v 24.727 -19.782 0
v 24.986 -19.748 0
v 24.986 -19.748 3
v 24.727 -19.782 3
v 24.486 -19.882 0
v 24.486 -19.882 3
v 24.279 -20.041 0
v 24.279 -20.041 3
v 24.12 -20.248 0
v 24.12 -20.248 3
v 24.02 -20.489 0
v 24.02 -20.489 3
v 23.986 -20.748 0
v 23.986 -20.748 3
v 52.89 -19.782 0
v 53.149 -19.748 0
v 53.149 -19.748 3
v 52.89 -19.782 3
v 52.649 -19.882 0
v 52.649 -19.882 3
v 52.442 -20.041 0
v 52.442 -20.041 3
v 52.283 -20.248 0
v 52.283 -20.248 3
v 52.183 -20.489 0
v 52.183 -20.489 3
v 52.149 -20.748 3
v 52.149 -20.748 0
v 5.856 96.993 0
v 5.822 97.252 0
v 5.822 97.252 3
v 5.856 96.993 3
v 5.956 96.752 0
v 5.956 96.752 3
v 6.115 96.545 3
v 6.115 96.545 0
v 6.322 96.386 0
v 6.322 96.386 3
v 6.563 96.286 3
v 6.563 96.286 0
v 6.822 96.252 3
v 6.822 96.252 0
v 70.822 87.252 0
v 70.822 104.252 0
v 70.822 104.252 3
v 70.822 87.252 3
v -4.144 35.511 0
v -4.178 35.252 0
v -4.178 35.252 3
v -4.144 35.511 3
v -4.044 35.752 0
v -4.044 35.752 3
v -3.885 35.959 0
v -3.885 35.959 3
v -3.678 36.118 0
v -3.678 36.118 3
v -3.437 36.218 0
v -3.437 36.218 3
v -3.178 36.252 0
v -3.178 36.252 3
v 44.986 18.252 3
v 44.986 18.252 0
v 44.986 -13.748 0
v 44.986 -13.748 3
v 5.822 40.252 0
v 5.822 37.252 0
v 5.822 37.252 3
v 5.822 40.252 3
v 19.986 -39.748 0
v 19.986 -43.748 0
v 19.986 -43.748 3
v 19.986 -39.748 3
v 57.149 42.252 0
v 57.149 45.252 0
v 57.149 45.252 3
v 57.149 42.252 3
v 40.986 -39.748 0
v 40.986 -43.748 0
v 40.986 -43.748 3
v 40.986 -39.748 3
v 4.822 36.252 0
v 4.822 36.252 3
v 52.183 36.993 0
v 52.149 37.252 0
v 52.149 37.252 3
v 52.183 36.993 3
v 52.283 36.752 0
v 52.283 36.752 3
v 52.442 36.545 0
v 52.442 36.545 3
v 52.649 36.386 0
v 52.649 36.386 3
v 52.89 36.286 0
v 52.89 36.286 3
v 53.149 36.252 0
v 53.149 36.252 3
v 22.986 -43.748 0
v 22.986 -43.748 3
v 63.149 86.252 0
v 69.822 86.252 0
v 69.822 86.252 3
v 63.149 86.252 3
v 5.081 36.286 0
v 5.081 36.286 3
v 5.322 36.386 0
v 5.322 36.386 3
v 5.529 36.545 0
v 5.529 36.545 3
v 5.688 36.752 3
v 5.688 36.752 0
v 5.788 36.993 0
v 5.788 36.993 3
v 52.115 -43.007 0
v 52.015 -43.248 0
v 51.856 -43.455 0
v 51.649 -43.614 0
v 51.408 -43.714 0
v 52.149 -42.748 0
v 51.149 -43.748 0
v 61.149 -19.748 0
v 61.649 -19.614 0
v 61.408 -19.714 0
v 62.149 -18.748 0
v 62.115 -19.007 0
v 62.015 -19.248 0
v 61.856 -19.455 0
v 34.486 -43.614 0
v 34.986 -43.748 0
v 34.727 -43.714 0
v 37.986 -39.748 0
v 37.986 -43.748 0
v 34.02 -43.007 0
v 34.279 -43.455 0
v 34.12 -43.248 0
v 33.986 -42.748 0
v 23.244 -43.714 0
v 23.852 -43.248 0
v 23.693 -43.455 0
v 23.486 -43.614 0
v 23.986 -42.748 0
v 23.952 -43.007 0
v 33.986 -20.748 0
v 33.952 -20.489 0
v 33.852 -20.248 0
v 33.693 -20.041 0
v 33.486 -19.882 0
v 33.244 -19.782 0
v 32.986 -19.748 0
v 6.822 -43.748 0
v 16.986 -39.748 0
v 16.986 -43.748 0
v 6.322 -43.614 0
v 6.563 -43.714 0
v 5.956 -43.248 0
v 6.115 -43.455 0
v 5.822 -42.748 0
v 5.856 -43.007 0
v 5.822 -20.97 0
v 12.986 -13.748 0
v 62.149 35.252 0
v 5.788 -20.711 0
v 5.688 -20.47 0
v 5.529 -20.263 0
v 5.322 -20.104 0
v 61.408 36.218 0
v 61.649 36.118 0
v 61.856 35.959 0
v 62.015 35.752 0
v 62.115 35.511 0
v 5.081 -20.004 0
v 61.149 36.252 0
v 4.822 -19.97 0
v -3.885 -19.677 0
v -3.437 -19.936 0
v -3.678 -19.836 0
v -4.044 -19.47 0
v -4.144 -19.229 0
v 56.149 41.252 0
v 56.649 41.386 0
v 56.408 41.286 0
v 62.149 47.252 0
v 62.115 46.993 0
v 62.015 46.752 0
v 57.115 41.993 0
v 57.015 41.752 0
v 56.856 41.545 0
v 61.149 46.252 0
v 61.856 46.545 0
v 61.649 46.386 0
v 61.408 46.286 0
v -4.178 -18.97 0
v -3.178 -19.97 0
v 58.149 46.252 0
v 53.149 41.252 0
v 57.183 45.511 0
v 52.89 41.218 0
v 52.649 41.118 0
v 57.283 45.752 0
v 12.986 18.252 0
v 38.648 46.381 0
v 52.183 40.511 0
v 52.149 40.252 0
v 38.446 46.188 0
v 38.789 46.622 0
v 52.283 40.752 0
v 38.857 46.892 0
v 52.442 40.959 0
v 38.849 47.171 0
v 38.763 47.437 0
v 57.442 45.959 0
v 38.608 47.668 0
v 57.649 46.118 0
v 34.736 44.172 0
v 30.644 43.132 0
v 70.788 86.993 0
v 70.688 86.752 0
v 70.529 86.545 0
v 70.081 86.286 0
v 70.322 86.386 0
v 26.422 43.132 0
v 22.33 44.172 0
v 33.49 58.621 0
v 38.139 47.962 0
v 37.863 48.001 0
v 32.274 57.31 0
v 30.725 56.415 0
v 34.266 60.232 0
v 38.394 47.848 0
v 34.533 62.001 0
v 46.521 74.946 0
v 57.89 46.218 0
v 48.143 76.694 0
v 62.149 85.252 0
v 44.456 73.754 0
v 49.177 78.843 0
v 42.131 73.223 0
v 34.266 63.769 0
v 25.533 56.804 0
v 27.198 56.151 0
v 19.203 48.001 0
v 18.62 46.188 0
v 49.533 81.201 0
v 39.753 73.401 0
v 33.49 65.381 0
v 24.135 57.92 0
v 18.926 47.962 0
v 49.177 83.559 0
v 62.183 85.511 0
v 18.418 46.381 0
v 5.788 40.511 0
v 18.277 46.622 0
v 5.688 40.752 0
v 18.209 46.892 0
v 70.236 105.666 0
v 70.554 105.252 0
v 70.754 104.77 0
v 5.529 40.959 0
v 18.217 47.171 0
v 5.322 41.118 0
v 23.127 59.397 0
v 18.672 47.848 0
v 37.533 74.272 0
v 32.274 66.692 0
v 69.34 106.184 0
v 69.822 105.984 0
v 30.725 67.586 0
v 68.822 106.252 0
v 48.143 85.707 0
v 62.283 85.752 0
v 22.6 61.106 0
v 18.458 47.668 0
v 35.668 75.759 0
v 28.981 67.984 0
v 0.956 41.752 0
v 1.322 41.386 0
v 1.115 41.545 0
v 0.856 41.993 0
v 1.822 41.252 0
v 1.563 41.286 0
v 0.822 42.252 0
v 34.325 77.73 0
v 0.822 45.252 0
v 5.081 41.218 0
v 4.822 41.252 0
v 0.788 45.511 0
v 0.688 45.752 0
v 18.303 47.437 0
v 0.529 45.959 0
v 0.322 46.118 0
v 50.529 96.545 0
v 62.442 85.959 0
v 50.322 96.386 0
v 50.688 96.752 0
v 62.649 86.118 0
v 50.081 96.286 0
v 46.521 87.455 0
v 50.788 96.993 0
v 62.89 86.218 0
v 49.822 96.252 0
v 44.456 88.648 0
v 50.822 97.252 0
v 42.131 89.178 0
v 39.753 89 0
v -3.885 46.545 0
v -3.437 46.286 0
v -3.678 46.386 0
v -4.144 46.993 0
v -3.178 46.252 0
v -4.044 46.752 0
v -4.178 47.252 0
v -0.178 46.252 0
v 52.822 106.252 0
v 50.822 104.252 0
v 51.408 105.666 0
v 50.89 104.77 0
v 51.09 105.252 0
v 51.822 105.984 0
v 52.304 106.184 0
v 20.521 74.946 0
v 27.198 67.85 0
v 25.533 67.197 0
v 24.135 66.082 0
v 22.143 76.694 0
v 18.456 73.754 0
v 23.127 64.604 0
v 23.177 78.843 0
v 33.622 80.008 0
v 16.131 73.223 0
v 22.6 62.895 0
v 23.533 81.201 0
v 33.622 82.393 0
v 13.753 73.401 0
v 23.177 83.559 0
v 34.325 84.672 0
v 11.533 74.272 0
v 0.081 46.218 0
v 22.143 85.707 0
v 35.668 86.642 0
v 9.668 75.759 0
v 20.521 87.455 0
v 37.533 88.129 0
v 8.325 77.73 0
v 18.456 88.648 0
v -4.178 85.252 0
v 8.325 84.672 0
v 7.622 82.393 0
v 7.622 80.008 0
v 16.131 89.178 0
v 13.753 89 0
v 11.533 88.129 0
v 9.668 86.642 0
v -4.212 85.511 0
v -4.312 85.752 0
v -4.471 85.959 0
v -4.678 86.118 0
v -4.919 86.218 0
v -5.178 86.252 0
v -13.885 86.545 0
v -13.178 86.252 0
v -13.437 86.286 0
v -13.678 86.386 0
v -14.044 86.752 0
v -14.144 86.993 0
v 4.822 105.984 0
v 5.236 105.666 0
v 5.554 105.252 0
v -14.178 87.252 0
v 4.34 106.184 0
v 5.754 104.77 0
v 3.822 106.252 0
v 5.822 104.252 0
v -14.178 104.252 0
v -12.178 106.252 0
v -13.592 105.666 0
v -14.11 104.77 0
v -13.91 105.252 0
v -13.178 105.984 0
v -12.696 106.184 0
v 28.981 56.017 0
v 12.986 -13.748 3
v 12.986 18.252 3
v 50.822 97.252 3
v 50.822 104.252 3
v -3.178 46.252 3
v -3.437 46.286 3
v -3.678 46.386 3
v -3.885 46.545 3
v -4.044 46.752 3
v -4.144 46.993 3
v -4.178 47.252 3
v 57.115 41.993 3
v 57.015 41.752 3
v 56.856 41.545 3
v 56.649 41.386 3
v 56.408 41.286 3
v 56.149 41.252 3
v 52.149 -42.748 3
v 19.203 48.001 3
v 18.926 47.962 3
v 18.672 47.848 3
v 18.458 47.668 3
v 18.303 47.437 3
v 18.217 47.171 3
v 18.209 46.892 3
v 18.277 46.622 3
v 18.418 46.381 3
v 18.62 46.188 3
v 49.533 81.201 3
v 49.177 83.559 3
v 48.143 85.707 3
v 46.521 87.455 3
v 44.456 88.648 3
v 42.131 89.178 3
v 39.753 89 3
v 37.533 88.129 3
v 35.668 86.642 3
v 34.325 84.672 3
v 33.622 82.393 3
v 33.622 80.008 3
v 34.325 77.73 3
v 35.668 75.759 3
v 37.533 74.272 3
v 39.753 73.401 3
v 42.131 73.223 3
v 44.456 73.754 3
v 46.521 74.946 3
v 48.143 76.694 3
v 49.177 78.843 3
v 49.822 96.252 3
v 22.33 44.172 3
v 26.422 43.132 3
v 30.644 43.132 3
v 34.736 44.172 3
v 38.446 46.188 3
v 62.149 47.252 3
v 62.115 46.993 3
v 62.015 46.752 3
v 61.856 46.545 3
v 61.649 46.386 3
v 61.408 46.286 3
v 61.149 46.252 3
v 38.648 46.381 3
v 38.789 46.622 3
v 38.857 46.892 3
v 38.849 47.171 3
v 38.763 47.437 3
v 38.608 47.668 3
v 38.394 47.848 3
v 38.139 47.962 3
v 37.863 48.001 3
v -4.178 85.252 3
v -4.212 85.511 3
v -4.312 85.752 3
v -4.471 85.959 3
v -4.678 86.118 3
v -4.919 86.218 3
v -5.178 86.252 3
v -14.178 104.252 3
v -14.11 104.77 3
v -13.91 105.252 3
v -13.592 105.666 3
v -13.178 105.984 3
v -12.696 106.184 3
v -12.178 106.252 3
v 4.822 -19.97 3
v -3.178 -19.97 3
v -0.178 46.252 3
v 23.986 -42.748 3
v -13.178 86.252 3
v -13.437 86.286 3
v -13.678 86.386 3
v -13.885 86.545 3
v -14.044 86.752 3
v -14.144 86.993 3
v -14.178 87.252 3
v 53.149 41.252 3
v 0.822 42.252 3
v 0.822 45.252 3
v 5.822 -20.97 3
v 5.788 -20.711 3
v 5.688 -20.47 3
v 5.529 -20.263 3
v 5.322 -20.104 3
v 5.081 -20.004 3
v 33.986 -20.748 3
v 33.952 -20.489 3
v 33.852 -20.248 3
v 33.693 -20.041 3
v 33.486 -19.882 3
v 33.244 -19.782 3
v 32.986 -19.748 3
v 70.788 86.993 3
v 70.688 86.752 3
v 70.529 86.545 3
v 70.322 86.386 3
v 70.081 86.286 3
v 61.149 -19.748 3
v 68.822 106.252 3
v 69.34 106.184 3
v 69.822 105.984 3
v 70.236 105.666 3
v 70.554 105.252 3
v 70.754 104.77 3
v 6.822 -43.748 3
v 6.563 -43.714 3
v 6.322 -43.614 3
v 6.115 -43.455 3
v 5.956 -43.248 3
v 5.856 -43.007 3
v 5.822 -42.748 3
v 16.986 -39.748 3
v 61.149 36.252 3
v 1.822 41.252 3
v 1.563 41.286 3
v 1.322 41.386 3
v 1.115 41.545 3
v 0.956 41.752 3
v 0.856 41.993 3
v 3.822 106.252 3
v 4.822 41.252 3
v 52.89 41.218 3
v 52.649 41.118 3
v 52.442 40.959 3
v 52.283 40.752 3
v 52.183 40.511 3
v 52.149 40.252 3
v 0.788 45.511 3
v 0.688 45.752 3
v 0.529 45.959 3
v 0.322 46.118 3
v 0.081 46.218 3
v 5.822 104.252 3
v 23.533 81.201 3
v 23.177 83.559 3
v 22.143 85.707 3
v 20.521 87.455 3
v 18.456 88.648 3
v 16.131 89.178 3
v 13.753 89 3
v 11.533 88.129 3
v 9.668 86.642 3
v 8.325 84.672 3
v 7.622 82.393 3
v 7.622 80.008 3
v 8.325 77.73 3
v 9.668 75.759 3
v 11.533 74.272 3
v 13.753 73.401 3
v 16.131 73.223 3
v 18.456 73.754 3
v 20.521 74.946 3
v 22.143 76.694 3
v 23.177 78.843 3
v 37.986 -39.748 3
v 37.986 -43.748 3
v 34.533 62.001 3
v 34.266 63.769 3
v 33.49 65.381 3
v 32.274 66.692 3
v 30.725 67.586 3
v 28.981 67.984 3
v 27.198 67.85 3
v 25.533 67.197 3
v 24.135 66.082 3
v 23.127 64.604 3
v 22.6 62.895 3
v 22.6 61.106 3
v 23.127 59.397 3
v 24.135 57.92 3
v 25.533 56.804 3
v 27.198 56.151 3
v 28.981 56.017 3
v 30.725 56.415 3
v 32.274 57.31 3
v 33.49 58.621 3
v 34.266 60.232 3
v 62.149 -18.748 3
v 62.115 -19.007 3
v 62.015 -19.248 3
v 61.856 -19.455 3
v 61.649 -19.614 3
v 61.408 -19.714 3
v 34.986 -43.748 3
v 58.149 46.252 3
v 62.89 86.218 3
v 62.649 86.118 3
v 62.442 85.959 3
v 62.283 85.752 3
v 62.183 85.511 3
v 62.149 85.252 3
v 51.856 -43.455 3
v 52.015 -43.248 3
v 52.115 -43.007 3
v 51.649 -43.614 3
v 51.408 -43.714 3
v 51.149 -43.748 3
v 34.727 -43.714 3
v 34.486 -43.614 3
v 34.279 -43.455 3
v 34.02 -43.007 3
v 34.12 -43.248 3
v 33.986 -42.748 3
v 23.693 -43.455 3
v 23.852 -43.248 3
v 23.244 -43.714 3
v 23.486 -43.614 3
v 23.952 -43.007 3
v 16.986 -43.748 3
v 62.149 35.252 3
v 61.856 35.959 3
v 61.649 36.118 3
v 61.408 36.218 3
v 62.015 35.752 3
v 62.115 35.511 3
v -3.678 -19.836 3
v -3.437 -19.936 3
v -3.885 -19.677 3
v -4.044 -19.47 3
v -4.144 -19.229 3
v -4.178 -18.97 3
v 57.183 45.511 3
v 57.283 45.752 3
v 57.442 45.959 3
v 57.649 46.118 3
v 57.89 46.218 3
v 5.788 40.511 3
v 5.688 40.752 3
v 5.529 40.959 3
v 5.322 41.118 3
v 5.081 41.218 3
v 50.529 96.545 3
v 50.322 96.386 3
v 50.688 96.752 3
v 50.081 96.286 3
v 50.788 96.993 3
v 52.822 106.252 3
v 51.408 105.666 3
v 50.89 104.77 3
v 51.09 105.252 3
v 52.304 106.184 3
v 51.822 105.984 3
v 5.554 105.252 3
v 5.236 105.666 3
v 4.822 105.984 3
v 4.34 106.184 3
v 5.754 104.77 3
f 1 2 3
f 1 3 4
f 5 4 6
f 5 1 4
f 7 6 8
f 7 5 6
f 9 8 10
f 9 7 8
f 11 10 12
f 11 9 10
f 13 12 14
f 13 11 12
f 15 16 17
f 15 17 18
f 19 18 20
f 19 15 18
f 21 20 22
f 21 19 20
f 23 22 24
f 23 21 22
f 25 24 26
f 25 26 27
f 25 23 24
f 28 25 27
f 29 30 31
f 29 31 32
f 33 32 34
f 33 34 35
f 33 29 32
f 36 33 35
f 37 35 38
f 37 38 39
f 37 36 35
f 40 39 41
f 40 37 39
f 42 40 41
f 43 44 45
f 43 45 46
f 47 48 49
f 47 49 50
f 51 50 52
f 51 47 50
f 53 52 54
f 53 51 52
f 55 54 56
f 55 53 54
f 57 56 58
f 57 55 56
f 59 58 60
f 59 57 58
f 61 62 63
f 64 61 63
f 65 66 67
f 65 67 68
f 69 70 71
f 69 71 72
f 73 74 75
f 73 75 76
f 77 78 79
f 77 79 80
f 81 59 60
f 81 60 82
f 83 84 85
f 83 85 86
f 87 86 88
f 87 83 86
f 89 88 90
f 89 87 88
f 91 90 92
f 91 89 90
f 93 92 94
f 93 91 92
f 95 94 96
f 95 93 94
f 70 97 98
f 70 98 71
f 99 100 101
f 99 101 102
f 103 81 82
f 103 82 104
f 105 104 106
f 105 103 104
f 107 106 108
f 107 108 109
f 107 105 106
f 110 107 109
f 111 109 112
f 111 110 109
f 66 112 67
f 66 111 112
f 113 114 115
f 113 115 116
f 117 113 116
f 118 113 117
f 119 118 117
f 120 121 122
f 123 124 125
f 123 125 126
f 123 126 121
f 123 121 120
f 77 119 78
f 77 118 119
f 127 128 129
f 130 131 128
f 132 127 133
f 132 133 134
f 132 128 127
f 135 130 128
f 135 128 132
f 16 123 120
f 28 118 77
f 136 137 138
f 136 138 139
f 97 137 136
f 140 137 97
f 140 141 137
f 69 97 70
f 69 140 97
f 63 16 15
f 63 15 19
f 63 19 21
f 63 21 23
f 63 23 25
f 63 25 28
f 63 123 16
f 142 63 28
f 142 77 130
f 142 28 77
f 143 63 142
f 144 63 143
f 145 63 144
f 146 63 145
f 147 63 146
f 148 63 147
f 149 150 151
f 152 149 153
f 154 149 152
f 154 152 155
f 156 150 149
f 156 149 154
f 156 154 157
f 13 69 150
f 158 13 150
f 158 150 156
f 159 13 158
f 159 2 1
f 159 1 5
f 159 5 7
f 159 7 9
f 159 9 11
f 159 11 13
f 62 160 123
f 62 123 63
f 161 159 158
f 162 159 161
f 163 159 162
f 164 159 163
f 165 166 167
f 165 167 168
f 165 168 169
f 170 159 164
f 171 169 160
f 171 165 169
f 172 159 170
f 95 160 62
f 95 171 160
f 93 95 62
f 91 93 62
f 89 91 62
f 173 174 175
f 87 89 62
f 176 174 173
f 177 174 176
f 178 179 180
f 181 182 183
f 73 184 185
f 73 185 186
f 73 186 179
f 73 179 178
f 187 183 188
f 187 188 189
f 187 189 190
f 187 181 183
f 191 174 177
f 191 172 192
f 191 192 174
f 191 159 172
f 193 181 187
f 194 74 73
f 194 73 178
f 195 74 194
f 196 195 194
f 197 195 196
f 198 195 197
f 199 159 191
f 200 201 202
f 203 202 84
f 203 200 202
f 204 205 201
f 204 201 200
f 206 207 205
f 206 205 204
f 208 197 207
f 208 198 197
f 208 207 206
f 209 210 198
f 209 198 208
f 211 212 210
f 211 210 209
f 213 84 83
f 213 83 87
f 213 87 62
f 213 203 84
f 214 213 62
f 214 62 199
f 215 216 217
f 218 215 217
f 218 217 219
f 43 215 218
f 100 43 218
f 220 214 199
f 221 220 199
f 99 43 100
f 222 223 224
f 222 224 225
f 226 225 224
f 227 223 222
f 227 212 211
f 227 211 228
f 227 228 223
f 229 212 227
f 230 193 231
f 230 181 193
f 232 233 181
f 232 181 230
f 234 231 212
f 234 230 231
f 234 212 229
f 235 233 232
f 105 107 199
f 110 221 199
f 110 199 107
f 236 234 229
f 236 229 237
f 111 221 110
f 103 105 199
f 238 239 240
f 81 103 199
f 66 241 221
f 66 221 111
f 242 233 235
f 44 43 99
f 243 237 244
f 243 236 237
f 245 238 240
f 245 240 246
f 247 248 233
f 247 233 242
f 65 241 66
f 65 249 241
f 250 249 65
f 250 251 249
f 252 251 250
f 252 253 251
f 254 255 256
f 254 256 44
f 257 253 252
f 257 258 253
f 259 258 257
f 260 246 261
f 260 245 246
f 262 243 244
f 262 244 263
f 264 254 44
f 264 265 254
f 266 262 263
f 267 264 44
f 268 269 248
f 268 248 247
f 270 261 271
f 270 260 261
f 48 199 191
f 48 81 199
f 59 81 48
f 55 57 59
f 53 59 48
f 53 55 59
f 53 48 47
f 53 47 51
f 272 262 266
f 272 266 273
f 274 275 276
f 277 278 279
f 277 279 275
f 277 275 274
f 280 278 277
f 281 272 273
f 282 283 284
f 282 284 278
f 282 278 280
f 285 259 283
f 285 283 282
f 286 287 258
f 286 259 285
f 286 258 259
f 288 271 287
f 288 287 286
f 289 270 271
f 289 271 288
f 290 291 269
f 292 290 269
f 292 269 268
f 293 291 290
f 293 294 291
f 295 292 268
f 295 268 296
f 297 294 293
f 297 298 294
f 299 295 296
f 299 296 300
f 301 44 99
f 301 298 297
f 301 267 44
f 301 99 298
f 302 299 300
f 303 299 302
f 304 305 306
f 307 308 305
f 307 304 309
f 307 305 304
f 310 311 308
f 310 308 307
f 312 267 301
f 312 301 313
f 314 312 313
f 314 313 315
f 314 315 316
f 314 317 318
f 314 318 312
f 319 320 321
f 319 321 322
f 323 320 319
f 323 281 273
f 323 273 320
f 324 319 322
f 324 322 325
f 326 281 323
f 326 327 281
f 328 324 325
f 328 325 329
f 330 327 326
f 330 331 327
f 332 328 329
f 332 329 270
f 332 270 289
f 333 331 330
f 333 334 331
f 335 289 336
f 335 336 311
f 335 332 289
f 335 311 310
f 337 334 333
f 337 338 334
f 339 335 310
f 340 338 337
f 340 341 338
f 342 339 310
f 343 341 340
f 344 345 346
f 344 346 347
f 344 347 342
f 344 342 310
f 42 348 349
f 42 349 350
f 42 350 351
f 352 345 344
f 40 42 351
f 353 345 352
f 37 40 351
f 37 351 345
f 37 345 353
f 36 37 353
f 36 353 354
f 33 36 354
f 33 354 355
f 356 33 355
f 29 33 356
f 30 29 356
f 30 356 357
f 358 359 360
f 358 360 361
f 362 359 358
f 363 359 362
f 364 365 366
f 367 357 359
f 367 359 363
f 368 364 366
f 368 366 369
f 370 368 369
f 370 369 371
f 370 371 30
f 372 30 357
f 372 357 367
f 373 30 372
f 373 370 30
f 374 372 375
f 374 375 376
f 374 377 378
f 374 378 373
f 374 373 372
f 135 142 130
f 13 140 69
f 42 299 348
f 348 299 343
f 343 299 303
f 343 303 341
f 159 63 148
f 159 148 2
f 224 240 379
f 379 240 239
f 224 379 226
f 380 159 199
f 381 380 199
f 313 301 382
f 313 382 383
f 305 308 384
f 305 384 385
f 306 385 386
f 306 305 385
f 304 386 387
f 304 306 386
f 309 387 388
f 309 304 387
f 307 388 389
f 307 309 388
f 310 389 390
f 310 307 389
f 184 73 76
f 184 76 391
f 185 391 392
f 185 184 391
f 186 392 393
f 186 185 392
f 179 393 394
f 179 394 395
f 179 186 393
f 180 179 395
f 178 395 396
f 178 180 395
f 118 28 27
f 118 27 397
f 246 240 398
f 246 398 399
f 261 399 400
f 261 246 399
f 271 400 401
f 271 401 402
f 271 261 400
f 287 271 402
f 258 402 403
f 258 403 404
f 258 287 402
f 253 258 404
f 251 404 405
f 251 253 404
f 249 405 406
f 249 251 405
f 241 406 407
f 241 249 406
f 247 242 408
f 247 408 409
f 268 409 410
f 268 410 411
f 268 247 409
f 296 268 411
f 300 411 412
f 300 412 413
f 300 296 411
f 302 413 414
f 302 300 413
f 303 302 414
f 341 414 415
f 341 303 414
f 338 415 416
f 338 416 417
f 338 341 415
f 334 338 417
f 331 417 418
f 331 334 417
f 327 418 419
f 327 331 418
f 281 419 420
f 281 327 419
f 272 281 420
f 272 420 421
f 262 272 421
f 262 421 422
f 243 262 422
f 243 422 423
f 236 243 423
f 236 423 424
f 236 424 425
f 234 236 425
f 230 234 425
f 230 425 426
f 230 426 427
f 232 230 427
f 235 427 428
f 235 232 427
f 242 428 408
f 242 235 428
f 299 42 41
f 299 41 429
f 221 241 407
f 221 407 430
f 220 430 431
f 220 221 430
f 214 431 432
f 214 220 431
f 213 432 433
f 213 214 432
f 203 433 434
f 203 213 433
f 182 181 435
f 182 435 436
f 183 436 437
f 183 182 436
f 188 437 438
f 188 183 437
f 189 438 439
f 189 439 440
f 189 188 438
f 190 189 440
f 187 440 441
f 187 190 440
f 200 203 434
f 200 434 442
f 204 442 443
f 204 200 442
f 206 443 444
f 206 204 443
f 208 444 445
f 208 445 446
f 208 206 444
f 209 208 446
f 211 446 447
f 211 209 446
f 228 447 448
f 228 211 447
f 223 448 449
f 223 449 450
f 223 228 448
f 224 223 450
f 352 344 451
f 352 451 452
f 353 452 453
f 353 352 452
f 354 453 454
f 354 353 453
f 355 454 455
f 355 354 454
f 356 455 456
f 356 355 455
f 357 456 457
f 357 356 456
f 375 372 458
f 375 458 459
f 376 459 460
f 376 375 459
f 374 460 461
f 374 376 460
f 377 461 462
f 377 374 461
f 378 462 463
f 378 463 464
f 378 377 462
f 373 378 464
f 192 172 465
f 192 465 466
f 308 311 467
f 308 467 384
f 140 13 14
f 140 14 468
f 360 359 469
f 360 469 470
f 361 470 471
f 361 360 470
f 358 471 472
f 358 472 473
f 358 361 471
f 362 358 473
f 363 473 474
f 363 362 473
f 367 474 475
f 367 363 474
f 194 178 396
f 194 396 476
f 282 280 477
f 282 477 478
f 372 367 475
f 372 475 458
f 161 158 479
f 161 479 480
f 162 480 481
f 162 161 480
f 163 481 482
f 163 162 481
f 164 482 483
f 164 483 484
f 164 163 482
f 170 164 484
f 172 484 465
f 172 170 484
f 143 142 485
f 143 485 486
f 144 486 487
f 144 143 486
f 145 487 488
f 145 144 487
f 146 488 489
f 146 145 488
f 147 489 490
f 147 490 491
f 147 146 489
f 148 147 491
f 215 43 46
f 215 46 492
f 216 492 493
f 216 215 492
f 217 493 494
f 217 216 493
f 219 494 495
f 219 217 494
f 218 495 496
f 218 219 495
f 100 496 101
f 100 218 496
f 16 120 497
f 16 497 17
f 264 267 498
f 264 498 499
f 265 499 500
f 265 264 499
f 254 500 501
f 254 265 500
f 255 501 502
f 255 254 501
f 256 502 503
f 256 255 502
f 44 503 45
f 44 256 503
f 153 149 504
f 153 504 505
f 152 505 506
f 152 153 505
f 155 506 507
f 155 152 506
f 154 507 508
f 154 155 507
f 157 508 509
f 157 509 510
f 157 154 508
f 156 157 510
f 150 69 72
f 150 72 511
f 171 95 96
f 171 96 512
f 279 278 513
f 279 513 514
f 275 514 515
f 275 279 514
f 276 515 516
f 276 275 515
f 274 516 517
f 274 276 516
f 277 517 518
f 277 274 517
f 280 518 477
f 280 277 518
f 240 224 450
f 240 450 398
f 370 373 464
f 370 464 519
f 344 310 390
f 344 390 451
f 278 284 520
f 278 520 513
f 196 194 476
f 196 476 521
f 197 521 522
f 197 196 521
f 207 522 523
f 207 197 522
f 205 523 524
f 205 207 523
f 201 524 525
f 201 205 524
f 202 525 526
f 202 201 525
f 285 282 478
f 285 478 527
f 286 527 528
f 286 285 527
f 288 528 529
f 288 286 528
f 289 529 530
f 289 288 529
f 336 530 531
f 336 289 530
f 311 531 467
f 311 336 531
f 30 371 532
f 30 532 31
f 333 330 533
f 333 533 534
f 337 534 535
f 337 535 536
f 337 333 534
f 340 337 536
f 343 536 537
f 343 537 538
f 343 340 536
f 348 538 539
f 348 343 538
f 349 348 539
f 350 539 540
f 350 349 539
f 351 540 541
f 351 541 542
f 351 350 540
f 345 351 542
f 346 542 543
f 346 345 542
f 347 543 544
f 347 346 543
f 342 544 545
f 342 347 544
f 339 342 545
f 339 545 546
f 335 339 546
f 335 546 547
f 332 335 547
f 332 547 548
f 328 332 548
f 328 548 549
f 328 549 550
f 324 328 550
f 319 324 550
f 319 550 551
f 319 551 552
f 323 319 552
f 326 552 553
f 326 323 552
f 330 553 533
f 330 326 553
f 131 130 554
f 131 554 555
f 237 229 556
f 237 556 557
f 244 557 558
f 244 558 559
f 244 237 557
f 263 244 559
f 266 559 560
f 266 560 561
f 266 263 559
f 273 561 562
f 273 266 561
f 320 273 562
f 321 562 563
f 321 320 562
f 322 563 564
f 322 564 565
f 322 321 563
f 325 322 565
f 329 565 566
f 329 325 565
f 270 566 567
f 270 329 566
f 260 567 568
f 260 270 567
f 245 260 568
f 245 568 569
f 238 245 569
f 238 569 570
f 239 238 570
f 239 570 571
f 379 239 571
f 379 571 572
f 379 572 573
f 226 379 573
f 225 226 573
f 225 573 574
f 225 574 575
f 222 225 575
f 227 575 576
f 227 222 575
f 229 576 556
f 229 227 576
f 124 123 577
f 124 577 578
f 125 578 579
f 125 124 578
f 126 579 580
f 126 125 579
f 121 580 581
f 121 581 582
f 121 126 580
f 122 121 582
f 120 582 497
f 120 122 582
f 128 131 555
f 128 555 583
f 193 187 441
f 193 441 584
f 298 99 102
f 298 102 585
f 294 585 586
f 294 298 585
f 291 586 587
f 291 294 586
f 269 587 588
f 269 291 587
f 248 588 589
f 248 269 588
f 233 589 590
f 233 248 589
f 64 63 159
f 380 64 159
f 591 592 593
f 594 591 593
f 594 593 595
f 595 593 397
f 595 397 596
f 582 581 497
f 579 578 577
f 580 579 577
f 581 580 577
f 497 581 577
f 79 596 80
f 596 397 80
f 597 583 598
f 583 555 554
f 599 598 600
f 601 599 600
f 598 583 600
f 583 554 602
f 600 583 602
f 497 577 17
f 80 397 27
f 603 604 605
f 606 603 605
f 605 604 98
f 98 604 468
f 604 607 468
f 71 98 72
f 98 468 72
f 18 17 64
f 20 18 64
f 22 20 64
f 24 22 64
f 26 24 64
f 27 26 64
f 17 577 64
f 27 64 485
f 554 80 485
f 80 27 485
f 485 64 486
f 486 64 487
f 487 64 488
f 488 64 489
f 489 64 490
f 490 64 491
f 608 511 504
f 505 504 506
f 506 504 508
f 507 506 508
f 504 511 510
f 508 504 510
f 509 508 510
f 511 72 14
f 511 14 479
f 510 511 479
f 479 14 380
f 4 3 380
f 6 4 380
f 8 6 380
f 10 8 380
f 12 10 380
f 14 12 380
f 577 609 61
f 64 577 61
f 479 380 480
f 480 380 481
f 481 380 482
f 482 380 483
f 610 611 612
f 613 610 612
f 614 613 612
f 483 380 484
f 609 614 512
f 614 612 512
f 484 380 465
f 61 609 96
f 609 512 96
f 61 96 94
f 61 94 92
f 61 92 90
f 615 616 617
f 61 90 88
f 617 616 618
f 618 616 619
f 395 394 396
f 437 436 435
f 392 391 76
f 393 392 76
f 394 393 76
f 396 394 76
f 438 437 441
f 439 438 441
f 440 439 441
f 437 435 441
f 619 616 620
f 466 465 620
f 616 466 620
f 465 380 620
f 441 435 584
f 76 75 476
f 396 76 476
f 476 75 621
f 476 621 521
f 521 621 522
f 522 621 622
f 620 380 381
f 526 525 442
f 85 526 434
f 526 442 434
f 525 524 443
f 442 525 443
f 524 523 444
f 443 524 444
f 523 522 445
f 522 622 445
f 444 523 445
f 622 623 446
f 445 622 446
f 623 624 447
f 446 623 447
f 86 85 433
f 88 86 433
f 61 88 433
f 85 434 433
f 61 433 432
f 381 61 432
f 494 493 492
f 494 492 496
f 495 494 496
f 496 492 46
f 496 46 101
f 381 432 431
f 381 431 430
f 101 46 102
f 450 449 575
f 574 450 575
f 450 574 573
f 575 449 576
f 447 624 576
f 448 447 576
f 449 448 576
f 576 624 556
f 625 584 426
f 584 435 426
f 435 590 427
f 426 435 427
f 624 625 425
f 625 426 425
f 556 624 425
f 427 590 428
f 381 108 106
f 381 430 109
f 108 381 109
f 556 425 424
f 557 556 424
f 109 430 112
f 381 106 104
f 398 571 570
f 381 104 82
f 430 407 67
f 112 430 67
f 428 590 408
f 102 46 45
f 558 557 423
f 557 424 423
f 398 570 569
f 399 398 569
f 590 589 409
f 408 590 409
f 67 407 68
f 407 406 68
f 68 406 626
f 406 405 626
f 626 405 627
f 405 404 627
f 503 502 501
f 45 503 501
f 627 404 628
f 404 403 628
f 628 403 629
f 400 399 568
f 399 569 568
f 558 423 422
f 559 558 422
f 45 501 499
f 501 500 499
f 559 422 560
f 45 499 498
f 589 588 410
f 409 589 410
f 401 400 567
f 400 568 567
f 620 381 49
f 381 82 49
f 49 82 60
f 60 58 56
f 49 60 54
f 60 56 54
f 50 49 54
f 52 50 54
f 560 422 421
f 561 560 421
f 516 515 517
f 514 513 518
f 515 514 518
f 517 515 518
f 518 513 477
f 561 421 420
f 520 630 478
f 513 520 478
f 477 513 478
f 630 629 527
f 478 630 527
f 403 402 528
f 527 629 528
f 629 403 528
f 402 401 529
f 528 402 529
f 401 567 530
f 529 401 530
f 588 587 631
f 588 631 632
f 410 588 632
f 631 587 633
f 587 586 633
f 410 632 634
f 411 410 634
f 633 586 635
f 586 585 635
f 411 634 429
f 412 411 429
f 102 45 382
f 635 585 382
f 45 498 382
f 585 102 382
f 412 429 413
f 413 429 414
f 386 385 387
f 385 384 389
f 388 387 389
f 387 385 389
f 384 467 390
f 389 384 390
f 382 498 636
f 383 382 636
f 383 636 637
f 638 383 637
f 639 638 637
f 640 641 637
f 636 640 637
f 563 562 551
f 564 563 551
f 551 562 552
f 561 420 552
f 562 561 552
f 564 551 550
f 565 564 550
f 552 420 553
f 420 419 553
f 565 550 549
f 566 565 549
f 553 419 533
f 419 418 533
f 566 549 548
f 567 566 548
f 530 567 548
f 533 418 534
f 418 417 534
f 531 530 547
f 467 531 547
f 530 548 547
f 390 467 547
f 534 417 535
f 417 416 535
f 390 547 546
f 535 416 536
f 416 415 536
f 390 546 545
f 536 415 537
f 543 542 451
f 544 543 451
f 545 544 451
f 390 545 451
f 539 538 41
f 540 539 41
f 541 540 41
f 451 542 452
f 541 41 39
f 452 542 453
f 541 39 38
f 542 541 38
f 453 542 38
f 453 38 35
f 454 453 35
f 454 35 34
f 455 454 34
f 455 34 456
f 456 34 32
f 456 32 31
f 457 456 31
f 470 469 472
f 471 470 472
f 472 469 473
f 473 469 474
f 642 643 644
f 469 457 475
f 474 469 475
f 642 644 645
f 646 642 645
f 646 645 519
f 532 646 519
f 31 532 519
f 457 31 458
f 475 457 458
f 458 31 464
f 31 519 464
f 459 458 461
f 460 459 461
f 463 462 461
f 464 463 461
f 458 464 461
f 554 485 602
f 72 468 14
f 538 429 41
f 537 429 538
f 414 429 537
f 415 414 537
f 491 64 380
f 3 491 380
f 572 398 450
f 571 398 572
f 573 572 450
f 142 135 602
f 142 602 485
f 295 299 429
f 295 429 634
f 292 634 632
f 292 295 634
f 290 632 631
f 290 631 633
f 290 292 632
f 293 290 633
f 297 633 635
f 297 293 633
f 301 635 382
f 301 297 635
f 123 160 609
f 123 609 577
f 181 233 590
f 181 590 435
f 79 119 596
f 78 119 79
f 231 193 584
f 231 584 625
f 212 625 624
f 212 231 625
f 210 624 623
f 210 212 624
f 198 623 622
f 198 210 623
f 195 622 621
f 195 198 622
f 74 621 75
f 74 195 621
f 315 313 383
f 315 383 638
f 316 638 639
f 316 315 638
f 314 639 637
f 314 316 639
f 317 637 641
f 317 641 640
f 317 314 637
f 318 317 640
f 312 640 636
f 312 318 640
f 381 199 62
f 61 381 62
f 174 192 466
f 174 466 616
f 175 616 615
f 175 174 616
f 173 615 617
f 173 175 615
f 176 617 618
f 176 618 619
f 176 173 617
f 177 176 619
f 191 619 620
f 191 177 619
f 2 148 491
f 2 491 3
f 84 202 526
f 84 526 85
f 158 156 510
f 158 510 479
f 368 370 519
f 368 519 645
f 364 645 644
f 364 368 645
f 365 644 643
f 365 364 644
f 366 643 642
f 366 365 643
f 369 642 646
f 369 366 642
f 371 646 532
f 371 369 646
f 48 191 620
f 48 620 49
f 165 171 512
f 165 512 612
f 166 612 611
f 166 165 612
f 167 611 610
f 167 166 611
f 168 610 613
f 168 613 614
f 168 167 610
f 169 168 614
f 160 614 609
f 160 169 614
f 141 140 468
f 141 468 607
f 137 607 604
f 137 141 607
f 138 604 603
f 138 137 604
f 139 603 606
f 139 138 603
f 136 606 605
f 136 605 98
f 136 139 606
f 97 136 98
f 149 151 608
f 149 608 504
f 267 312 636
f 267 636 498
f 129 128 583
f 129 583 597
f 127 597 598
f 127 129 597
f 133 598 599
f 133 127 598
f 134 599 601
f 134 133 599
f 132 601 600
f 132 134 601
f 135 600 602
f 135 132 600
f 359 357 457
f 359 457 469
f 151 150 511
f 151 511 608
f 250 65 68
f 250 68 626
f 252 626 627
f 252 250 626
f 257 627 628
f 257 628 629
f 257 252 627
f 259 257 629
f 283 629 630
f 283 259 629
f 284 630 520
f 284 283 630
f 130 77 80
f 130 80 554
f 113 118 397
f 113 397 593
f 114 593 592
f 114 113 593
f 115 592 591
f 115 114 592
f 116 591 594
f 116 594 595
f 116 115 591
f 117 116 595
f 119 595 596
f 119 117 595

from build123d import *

# Parameters (mm, degrees)
MODEL_R                 = 6
MODEL_R_2               = 8
SALIENTE_EXTRUIR1_DEPTH = 3


with BuildPart() as part:
    # Model → Saliente-Extruir1 (new body)
    with BuildSketch(Plane.XY):
        with BuildLine():
            Line((52.149227215, 40.252), (52.149227215, 37.252))
            ThreePointArc((52.149227215, 37.252), (52.442120434, 36.544893219), (53.149227215, 36.252))
            Line((53.149227215, 36.252), (61.149227215, 36.252))
            ThreePointArc((61.149227215, 36.252), (61.856333997, 35.959106781), (62.149227215, 35.252))
            Line((62.149227215, 35.252), (62.149227215, 12.636622367))
            Line((62.149227215, 12.636622367), (62.149227215, -18.748))
            ThreePointArc((62.149227215, -18.748), (61.856333997, -19.455106781), (61.149227215, -19.748))
            Line((61.149227215, -19.748), (53.149227215, -19.748))
            ThreePointArc((53.149227215, -19.748), (52.442120434, -20.040893219), (52.149227215, -20.748))
            Line((52.149227215, -20.748), (52.149227215, -42.748))
            ThreePointArc((52.149227215, -42.748), (51.856333997, -43.455106781), (51.149227215, -43.748))
            Line((51.149227215, -43.748), (40.985615848, -43.748))
            Line((40.985615848, -43.748), (40.985615848, -39.748))
            Line((40.985615848, -39.748), (37.985615848, -39.748))
            Line((37.985615848, -39.748), (37.985615848, -43.748))
            Line((37.985615848, -43.748), (34.985615848, -43.748))
            ThreePointArc((34.985615848, -43.748), (34.278509066, -43.455106781), (33.985615848, -42.748))
            Line((33.985615848, -42.748), (33.985615848, -20.748))
            ThreePointArc((33.985615848, -20.748), (33.692722629, -20.040893219), (32.985615848, -19.748))
            Line((32.985615848, -19.748), (24.985615848, -19.748))
            ThreePointArc((24.985615848, -19.748), (24.278509066, -20.040893219), (23.985615848, -20.748))
            Line((23.985615848, -20.748), (23.985615848, -42.748))
            ThreePointArc((23.985615848, -42.748), (23.692722629, -43.455106781), (22.985615848, -43.748))
            Line((22.985615848, -43.748), (19.985615848, -43.748))
            Line((19.985615848, -43.748), (19.985615848, -39.748))
            Line((19.985615848, -39.748), (16.985615848, -39.748))
            Line((16.985615848, -39.748), (16.985615848, -43.748))
            Line((16.985615848, -43.748), (6.82200448, -43.748))
            ThreePointArc((6.82200448, -43.748), (6.114897699, -43.455106781), (5.82200448, -42.748))
            Line((5.82200448, -42.748), (5.82200448, -20.969725915))
            ThreePointArc((5.82200448, -20.969725915), (5.529111261, -20.262619134), (4.82200448, -19.969725915))
            Line((4.82200448, -19.969725915), (-3.17799552, -19.969725915))
            ThreePointArc((-3.17799552, -19.969725915), (-3.885102301, -19.676832696), (-4.17799552, -18.969725915))
            Line((-4.17799552, -18.969725915), (-4.17799552, 14.641137042))
            Line((-4.17799552, 14.641137042), (-4.17799552, 35.252))
            ThreePointArc((-4.17799552, 35.252), (-3.885102301, 35.959106781), (-3.17799552, 36.252))
            Line((-3.17799552, 36.252), (4.82200448, 36.252))
            ThreePointArc((4.82200448, 36.252), (5.529111261, 36.544893219), (5.82200448, 37.252))
            Line((5.82200448, 37.252), (5.82200448, 40.252))
            ThreePointArc((5.82200448, 40.252), (5.529111261, 40.959106781), (4.82200448, 41.252))
            Line((4.82200448, 41.252), (1.82200448, 41.252))
            ThreePointArc((1.82200448, 41.252), (1.114897699, 41.544893219), (0.82200448, 42.252))
            Line((0.82200448, 42.252), (0.82200448, 45.252))
            ThreePointArc((0.82200448, 45.252), (0.529111261, 45.959106781), (-0.17799552, 46.252))
            Line((-0.17799552, 46.252), (-3.17799552, 46.252))
            ThreePointArc((-3.17799552, 46.252), (-3.885102301, 46.544893219), (-4.17799552, 47.252))
            Line((-4.17799552, 47.252), (-4.17799552, 85.252))
            ThreePointArc((-4.17799552, 85.252), (-4.470888739, 85.959106781), (-5.17799552, 86.252))
            Line((-5.17799552, 86.252), (-8.67799552, 86.252))
            Line((-8.67799552, 86.252), (-13.17799552, 86.252))
            ThreePointArc((-13.17799552, 86.252), (-13.885102301, 86.544893219), (-14.17799552, 87.252))
            Line((-14.17799552, 87.252), (-14.17799552, 104.252))
            ThreePointArc((-14.17799552, 104.252), (-13.592209082, 105.666213562), (-12.17799552, 106.252))
            Line((-12.17799552, 106.252), (3.82200448, 106.252))
            ThreePointArc((3.82200448, 106.252), (5.236218042, 105.666213562), (5.82200448, 104.252))
            Line((5.82200448, 104.252), (5.82200448, 97.252))
            ThreePointArc((5.82200448, 97.252), (6.114897699, 96.544893219), (6.82200448, 96.252))
            Line((6.82200448, 96.252), (49.82200448, 96.252))
            ThreePointArc((49.82200448, 96.252), (50.529111261, 96.544893219), (50.82200448, 97.252))
            Line((50.82200448, 97.252), (50.82200448, 104.252))
            ThreePointArc((50.82200448, 104.252), (51.407790918, 105.666213562), (52.82200448, 106.252))
            Line((52.82200448, 106.252), (68.82200448, 106.252))
            ThreePointArc((68.82200448, 106.252), (70.236218042, 105.666213562), (70.82200448, 104.252))
            Line((70.82200448, 104.252), (70.82200448, 87.252))
            ThreePointArc((70.82200448, 87.252), (70.529111261, 86.544893219), (69.82200448, 86.252))
            Line((69.82200448, 86.252), (63.149227215, 86.252))
            ThreePointArc((63.149227215, 86.252), (62.442120434, 85.959106781), (62.149227215, 85.252))
            Line((62.149227215, 85.252), (62.149227215, 66.752))
            Line((62.149227215, 66.752), (62.149227215, 47.252))
            ThreePointArc((62.149227215, 47.252), (61.856333997, 46.544893219), (61.149227215, 46.252))
            Line((61.149227215, 46.252), (58.149227215, 46.252))
            ThreePointArc((58.149227215, 46.252), (57.442120434, 45.959106781), (57.149227215, 45.252))
            Line((57.149227215, 45.252), (57.149227215, 42.252))
            ThreePointArc((57.149227215, 42.252), (56.856333997, 41.544893219), (56.149227215, 41.252))
            Line((56.149227215, 41.252), (53.149227215, 41.252))
            ThreePointArc((53.149227215, 41.252), (52.442120434, 40.959106781), (52.149227215, 40.252))
        make_face()
        with Locations((28.532877275, 62.00057999)):
            Circle(MODEL_R, mode=Mode.SUBTRACT)
        with Locations((41.532877275, 81.20057999)):
            Circle(MODEL_R_2, mode=Mode.SUBTRACT)
        with Locations((15.532877275, 81.20057999)):
            Circle(MODEL_R_2, mode=Mode.SUBTRACT)
        Polygon((12.985615848, 18.252), (29.485615848, 18.252), (44.985615848, 18.252), (44.985615848, -13.748), (12.985615848, -13.748), align=None, mode=Mode.SUBTRACT)
        with BuildLine():
            Line((37.863153208, 48.00057999), (19.202601343, 48.00057999))
            ThreePointArc((19.202601343, 48.00057999), (18.250601998, 47.306680051), (18.619787227, 46.187974485))
            ThreePointArc((18.619787227, 46.187974485), (28.532877275, 43.00057999), (38.445967323, 46.187974485))
            ThreePointArc((38.445967323, 46.187974485), (38.815152552, 47.306680051), (37.863153208, 48.00057999))
        make_face(mode=Mode.SUBTRACT)
    extrude(amount=SALIENTE_EXTRUIR1_DEPTH)


solid = part.part
